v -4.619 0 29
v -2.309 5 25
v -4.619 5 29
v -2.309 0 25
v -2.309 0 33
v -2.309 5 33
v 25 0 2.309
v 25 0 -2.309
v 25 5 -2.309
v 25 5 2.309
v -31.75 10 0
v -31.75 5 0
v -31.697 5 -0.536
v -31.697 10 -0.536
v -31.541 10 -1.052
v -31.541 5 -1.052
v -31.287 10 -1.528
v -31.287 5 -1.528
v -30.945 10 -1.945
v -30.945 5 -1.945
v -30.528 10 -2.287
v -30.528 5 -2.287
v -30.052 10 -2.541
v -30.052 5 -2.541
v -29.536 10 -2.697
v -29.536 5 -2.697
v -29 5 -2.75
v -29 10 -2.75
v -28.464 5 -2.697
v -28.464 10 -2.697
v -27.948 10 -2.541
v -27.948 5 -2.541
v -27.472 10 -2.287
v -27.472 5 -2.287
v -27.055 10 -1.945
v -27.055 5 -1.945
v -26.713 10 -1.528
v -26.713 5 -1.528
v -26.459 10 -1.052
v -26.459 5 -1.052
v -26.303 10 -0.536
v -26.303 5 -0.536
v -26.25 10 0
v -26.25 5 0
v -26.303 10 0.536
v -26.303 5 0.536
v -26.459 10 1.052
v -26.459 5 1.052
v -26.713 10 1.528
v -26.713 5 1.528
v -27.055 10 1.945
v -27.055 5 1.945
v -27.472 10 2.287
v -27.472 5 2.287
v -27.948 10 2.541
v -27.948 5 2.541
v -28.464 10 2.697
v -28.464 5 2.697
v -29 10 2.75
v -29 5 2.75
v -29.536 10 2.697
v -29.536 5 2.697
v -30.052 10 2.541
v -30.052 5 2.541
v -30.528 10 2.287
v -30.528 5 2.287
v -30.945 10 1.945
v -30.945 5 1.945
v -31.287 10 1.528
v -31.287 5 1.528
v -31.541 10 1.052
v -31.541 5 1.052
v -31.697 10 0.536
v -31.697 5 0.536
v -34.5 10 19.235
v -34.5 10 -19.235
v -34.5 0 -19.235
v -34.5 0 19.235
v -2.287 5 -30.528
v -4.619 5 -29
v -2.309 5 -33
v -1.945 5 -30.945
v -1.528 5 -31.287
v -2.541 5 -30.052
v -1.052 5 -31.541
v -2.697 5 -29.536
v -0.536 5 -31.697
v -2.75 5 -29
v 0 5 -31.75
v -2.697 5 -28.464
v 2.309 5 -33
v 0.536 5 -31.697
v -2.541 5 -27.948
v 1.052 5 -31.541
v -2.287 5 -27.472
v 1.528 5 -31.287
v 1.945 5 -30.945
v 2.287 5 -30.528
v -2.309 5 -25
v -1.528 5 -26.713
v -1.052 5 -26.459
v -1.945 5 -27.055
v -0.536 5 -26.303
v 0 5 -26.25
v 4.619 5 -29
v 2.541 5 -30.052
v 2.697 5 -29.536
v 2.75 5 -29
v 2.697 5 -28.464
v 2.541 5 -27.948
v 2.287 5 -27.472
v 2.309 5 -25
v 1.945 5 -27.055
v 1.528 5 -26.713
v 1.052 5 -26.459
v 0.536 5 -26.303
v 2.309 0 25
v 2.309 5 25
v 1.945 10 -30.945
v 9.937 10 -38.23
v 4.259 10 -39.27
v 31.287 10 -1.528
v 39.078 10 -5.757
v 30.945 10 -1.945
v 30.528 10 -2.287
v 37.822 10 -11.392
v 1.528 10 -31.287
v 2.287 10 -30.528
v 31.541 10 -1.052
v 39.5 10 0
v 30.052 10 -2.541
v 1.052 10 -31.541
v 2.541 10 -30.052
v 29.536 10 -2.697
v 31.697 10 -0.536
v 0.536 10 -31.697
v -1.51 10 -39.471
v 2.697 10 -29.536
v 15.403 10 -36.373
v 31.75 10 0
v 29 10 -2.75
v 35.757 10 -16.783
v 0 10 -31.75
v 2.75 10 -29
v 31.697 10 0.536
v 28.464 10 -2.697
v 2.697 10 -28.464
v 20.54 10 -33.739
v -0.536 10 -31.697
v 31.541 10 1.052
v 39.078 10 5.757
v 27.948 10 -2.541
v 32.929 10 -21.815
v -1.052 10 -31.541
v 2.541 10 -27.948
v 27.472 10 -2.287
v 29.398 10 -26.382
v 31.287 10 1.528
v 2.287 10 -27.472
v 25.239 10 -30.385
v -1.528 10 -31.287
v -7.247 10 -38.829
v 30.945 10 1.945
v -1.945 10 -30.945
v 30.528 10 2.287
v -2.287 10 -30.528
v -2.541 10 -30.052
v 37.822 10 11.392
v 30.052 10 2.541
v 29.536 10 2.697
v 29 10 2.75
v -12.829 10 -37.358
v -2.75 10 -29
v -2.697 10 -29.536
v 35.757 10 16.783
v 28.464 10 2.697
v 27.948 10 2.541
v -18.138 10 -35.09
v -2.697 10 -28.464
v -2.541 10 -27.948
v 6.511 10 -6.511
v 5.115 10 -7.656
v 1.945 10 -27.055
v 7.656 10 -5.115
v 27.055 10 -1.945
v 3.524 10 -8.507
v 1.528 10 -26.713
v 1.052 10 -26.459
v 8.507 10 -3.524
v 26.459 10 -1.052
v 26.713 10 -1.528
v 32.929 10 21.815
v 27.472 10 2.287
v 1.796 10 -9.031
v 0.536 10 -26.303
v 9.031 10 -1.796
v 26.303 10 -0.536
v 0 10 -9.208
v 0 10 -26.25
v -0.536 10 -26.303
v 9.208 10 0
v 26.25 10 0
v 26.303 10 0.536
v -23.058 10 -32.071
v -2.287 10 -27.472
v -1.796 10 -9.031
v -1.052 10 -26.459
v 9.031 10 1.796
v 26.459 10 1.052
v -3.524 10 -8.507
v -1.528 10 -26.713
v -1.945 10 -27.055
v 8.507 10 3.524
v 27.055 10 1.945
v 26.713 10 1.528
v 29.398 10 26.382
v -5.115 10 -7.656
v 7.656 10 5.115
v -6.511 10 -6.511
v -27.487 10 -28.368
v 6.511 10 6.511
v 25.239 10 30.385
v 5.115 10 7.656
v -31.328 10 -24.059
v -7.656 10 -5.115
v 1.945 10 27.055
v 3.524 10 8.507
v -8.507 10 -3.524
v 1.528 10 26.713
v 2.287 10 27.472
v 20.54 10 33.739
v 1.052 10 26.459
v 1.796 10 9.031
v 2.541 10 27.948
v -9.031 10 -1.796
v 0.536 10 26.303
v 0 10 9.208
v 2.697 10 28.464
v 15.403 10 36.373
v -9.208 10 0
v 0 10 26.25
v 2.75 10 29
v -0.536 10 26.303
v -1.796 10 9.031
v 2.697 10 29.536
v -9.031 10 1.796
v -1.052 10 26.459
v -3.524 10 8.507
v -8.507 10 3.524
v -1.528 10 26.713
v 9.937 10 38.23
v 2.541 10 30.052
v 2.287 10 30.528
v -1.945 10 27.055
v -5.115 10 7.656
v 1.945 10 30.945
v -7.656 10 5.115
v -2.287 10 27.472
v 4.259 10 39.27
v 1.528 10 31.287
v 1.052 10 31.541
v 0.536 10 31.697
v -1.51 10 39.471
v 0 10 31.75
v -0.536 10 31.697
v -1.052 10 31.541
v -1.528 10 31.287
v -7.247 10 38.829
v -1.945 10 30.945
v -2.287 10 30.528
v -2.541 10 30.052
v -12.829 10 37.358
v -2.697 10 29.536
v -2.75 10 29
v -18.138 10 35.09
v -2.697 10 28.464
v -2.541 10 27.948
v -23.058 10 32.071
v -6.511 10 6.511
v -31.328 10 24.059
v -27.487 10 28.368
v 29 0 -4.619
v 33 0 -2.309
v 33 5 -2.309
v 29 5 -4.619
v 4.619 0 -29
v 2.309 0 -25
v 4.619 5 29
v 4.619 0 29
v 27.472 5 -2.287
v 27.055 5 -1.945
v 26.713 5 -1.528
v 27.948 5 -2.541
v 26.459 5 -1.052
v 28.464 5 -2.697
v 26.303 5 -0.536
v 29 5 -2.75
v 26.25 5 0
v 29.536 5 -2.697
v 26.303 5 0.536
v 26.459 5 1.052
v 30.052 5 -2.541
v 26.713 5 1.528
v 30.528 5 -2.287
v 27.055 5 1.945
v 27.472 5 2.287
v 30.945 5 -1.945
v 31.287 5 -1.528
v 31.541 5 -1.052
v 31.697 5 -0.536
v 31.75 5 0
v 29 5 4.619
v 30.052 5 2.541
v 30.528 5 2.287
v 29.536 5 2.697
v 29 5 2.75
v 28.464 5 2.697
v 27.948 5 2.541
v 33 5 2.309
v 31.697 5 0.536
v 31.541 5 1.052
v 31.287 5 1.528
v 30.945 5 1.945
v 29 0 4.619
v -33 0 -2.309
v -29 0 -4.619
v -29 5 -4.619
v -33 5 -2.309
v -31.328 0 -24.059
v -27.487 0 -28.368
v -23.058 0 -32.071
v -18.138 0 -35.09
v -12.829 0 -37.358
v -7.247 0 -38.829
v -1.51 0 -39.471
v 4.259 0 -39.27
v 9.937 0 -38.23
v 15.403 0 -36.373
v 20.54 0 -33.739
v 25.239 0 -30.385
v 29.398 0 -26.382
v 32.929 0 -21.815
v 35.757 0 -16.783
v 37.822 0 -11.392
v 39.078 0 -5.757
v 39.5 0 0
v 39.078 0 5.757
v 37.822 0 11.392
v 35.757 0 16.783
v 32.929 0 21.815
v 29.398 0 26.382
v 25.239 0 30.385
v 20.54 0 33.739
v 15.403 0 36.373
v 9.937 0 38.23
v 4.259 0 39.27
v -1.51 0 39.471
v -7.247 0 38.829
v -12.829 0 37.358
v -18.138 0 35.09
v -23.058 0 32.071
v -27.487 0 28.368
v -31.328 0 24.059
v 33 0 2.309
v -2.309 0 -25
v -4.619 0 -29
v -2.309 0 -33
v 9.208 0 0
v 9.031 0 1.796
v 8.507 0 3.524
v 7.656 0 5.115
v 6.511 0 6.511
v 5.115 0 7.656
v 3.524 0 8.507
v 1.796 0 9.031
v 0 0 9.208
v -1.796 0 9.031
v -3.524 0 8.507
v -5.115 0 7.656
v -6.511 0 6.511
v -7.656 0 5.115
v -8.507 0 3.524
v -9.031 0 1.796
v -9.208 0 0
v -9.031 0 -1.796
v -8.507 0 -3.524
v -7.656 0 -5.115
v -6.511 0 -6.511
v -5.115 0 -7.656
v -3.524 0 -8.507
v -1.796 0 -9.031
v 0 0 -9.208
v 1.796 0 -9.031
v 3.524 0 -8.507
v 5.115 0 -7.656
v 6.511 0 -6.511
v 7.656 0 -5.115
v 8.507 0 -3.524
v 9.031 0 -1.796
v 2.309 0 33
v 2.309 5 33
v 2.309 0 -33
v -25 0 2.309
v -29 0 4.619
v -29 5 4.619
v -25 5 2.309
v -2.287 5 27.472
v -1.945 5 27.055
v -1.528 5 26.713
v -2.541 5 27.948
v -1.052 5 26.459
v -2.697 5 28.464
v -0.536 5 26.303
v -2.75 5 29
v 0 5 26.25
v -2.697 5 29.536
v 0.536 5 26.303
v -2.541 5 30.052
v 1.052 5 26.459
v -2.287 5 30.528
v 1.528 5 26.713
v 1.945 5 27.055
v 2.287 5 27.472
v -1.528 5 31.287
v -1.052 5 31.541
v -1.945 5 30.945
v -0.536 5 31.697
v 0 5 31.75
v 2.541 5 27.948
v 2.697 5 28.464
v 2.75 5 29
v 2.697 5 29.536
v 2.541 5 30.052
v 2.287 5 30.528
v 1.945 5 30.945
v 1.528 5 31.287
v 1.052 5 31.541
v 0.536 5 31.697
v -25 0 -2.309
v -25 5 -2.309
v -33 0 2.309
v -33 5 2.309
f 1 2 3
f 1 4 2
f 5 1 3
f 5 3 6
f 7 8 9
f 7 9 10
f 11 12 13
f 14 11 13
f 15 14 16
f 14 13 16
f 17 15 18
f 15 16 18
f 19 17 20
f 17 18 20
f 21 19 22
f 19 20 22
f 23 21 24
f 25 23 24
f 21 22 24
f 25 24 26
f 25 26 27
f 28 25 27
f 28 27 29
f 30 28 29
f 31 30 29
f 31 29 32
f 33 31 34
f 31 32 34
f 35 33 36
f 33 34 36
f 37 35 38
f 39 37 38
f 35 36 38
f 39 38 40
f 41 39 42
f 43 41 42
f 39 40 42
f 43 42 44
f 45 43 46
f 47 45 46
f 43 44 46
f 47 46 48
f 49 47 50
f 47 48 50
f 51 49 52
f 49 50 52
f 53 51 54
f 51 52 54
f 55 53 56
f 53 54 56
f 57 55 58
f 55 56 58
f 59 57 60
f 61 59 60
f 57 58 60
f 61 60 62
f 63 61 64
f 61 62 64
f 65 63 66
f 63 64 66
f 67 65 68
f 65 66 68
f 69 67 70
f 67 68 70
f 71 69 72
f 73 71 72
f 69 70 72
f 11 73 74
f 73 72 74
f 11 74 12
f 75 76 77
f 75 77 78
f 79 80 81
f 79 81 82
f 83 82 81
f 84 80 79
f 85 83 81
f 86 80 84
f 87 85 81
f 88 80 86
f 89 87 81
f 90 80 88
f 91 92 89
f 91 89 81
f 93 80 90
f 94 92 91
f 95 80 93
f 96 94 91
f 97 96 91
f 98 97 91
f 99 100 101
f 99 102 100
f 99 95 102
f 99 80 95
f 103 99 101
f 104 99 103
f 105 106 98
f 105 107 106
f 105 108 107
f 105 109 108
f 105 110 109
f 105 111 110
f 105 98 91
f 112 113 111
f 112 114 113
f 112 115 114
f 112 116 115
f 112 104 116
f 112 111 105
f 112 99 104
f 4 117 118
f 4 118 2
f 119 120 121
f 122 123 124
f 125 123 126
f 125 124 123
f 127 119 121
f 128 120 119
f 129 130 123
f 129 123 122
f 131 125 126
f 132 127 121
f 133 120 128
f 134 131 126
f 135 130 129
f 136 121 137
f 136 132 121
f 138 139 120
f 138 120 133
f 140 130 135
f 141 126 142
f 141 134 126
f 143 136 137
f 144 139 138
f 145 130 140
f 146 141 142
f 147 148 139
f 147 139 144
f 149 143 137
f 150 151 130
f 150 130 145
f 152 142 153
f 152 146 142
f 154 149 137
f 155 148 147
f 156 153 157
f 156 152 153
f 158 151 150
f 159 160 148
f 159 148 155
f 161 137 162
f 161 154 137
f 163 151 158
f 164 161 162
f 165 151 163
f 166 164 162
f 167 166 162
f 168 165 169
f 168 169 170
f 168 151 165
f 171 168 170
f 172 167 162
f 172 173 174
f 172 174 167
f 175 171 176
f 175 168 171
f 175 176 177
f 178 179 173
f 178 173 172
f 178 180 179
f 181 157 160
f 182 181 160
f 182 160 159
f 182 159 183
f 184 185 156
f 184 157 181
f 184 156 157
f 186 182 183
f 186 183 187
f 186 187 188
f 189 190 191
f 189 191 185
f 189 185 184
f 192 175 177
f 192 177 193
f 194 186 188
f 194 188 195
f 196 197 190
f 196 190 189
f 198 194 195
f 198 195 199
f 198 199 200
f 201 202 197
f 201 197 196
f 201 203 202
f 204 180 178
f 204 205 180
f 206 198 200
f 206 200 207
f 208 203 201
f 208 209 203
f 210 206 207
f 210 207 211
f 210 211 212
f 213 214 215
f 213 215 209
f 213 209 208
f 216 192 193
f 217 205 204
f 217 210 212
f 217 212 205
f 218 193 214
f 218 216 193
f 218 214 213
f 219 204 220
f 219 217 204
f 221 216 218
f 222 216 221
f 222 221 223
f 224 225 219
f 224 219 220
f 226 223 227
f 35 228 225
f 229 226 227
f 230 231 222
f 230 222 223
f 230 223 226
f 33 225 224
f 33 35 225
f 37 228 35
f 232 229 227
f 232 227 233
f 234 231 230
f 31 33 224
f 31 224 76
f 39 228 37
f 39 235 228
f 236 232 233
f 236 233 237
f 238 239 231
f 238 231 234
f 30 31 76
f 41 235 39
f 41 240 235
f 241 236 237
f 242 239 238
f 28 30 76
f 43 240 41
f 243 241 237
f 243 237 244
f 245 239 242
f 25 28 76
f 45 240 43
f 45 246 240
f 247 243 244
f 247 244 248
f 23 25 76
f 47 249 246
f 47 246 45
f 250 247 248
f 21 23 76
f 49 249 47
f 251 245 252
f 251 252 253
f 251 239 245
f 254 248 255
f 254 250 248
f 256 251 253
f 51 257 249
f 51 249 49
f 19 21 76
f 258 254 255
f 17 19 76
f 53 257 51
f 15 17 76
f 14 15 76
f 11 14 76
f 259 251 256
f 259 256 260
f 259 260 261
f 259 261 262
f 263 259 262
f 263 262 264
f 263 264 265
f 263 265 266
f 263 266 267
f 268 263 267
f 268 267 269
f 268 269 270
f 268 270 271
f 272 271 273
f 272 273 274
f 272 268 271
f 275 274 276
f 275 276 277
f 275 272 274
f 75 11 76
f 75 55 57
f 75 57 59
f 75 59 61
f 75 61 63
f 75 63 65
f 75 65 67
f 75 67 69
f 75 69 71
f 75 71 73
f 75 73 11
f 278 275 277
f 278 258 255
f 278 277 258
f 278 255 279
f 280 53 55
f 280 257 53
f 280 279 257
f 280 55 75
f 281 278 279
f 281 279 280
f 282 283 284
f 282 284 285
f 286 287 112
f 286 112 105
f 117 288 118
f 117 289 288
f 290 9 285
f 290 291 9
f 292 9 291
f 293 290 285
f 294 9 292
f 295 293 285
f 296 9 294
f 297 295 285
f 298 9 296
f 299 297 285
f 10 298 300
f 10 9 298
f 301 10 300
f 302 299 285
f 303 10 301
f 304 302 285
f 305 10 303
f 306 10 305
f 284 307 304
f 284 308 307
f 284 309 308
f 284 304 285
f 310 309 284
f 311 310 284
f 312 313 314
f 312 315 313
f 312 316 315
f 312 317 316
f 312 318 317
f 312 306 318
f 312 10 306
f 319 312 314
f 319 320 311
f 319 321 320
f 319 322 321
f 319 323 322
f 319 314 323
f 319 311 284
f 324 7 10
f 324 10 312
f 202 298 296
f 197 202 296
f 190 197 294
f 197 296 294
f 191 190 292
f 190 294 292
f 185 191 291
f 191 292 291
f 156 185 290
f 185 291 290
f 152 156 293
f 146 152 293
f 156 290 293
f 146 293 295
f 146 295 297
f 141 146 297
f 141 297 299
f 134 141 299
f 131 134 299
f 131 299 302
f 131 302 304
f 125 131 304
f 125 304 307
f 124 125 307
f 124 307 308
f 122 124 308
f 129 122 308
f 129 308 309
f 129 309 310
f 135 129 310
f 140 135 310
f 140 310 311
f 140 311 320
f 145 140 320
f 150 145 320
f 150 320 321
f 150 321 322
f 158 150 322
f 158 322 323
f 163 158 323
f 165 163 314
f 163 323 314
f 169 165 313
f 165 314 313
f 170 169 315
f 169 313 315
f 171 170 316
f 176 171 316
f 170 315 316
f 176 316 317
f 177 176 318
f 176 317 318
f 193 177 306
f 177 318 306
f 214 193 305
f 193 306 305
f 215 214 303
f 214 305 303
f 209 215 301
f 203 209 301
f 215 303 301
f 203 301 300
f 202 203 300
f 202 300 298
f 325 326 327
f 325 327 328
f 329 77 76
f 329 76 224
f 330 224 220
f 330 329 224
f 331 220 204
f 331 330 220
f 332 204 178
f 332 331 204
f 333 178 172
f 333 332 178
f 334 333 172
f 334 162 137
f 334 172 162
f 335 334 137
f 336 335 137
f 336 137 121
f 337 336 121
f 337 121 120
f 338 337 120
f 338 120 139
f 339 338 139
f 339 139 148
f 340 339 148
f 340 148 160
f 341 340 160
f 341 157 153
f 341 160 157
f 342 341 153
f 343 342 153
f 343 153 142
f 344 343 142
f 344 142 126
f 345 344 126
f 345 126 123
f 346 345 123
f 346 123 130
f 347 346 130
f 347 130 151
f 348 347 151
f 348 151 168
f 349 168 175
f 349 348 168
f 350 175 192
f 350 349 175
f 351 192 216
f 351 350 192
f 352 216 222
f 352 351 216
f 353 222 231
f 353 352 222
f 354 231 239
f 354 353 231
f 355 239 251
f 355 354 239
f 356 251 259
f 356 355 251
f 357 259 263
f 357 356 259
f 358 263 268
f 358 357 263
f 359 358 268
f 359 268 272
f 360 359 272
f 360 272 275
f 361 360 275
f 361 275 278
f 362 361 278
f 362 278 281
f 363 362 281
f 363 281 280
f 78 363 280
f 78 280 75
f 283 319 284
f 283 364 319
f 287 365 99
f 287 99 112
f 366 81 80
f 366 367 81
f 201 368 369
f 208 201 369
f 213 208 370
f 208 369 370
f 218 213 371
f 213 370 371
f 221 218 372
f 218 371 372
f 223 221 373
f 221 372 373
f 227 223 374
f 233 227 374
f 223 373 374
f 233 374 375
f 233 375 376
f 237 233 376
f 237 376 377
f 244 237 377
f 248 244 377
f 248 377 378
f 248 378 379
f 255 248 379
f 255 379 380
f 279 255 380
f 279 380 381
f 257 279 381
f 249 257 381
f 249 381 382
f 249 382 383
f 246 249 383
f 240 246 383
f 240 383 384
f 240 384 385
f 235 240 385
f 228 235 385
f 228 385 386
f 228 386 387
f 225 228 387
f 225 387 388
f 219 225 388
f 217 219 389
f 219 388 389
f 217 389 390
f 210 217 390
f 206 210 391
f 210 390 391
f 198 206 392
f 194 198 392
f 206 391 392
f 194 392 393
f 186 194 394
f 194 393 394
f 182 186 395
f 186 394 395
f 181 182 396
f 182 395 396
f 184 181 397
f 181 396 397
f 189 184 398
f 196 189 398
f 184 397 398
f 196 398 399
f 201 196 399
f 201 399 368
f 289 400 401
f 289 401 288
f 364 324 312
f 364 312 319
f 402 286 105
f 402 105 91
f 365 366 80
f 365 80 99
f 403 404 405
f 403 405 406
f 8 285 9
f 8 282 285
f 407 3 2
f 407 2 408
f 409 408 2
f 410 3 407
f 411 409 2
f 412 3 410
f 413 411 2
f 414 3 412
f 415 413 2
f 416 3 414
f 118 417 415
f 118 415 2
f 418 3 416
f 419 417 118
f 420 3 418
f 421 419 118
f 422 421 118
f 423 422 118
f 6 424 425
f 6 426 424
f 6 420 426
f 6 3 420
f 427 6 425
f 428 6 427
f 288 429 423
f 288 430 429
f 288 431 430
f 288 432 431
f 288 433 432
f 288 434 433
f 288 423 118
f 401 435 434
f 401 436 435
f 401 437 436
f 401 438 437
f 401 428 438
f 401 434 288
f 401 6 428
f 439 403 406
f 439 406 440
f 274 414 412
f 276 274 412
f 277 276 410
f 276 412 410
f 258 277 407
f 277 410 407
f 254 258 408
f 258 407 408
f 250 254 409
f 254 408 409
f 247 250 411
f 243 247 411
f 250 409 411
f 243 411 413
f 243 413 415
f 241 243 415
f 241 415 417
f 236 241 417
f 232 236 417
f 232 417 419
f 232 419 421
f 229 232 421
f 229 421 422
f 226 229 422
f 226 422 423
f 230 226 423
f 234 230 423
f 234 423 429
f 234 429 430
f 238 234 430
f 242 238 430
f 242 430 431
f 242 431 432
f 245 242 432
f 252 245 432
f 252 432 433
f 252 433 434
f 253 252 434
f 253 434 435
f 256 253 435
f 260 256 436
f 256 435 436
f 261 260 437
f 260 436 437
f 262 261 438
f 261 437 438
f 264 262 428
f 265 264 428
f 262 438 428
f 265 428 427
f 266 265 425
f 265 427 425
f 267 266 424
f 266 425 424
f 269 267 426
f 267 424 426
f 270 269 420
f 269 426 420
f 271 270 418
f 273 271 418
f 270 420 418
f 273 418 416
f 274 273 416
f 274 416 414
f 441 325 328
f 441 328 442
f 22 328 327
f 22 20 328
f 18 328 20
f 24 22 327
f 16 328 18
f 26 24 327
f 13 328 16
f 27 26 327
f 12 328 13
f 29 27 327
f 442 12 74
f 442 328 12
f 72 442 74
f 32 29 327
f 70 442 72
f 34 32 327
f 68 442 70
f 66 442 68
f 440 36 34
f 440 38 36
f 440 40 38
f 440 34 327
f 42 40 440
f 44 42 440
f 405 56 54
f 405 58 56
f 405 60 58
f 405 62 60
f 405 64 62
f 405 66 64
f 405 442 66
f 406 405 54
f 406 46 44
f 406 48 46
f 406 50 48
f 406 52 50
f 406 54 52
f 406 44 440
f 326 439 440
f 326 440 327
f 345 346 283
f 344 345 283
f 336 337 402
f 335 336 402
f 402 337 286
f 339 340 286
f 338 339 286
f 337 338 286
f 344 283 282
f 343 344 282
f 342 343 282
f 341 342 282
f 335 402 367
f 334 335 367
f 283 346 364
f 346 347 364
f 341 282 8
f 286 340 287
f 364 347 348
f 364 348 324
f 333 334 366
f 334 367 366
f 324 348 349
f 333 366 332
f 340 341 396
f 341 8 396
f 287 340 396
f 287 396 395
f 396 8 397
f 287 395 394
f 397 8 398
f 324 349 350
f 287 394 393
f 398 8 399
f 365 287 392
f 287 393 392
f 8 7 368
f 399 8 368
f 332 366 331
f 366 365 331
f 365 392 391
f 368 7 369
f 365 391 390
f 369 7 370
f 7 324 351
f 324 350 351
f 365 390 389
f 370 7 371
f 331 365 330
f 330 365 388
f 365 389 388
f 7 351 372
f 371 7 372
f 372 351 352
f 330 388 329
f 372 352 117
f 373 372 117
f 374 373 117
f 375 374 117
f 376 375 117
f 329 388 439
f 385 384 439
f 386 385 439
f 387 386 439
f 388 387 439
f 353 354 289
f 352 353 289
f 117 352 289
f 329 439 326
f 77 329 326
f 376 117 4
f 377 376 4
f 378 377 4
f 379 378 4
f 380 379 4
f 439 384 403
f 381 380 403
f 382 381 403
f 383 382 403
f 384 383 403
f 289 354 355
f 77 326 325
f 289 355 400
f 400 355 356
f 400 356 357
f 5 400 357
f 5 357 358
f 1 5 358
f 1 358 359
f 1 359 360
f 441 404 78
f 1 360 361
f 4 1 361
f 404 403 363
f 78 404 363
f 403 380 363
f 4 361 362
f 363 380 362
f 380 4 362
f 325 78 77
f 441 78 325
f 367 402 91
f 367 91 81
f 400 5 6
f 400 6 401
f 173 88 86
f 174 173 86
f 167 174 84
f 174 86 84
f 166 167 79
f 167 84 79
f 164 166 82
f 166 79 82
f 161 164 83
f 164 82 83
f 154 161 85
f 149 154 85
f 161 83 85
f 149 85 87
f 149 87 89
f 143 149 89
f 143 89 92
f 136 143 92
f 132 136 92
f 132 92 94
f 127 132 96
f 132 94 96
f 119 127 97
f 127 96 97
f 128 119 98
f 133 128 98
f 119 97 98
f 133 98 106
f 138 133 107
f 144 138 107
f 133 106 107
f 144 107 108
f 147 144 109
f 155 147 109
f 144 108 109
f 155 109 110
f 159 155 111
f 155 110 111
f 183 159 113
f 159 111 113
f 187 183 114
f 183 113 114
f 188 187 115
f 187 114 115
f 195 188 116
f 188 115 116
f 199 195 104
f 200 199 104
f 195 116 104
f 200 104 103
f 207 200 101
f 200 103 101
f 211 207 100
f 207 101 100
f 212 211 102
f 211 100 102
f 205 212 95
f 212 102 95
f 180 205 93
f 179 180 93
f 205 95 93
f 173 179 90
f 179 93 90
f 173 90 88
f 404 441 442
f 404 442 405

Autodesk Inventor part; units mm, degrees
ref_plane "YZ Plane" through (0, 0, 0) normal (1, 0, 0) x (0, 1, 0)
ref_plane "XZ Plane" through (0, 0, 0) normal (0, 1, 0) x (-1, 0, 0)
ref_plane "XY Plane" through (0, 0, 0) normal (0, 0, 1) x (1, 0, 0)
sketch "Sketch1" plane through (0, 0, 0) normal (0, 1, 0) x (-1, 0, 0)
  circle A0 centre (0, 0) radius 39.5
  circle A1 centre (0, 0) radius 10
  circle A2 centre (0, 0) radius 29
  circle A3 centre (29, 0) radius 2.75
  circle A4 centre (0, 29) radius 2.75
  circle A5 centre (-29, 0) radius 2.75
  circle A6 centre (0, -29) radius 2.75
  dimension "d2" = 58
  dimension "d0" = 79
  dimension "d1" = 20
  dimension "d3" = 5.5
  dimension "d6" = 360
extrude "Extrusion1" add sketch "Sketch1" along normal blind 10 contours A0 | A1 | A3 A2 A6 A5 A4
sketch "Sketch3" plane through (0, 10, 0) normal (0, 1, 0) x (1, 0, 0)
  line L0 (-34.5, 50.157) -> (-34.5, -49.8555)
  circle A0 centre (0, 0) radius 39.5 projected
  point P0 (-34.5, -19.2354)
  point P1 (-34.5, 19.2354)
  dimension "d18" = 5
extrude "Extrusion3" cut sketch "Sketch3" along normal through all both and the other way through all contours L0 A0 picked at (-35.5583, 3.956)
sketch "Sketch4" plane through (0, 0, 0) normal (0, -1, 0) x (1, 0, 0)
  circle A0 centre (0, 0) radius 9.2075
  dimension "d21" = 18.415
extrude "Extrusion4" cut sketch "Sketch4" against normal through all
sketch "Sketch5" plane through (0, 0, 0) normal (0, -1, 0) x (1, 0, 0)
  line L0 (33, -2.3094) -> (29, -4.6188)
  line L1 (29, -4.6188) -> (25, -2.3094)
  line L2 (25, -2.3094) -> (25, 2.3094)
  line L3 (25, 2.3094) -> (29, 4.6188)
  line L4 (29, 4.6188) -> (33, 2.3094)
  line L5 (33, 2.3094) -> (33, -2.3094)
  circle A0 centre (29, 0) radius 2.75
  line L6 (-2.3094, 33) -> (2.3094, 33)
  line L7 (4.6188, 29) -> (2.3094, 25)
  line L8 (2.3094, 25) -> (-2.3094, 25)
  line L9 (-2.3094, 25) -> (-4.6188, 29)
  circle A1 centre (0, 29) radius 2.75
  line L10 (2.3094, 33) -> (4.6188, 29)
  line L11 (-4.6188, 29) -> (-2.3094, 33)
  line L12 (-33, -2.3094) -> (-33, 2.3094)
  line L13 (-29, 4.6188) -> (-25, 2.3094)
  line L14 (-25, 2.3094) -> (-25, -2.3094)
  line L15 (-25, -2.3094) -> (-29, -4.6188)
  circle A2 centre (-29, 0) radius 2.75
  line L16 (-33, 2.3094) -> (-29, 4.6188)
  line L17 (-29, -4.6188) -> (-33, -2.3094)
  line L18 (2.3094, -33) -> (-2.3094, -33)
  line L19 (-4.6188, -29) -> (-2.3094, -25)
  line L20 (-2.3094, -25) -> (2.3094, -25)
  line L21 (2.3094, -25) -> (4.6188, -29)
  circle A3 centre (0, -29) radius 2.75
  line L22 (-2.3094, -33) -> (-4.6188, -29)
  line L23 (4.6188, -29) -> (2.3094, -33)
  point P0 (0, 0)
  point P1 (0, 0)
  point P2 (33, 0)
  point P3 (0, 33)
  point P4 (-33, 0)
  point P5 (0, -33)
  dimension "d27" = 360
extrude "Extrusion5" cut sketch "Sketch5" against normal blind 5
properties part number "Adapter Plate"
